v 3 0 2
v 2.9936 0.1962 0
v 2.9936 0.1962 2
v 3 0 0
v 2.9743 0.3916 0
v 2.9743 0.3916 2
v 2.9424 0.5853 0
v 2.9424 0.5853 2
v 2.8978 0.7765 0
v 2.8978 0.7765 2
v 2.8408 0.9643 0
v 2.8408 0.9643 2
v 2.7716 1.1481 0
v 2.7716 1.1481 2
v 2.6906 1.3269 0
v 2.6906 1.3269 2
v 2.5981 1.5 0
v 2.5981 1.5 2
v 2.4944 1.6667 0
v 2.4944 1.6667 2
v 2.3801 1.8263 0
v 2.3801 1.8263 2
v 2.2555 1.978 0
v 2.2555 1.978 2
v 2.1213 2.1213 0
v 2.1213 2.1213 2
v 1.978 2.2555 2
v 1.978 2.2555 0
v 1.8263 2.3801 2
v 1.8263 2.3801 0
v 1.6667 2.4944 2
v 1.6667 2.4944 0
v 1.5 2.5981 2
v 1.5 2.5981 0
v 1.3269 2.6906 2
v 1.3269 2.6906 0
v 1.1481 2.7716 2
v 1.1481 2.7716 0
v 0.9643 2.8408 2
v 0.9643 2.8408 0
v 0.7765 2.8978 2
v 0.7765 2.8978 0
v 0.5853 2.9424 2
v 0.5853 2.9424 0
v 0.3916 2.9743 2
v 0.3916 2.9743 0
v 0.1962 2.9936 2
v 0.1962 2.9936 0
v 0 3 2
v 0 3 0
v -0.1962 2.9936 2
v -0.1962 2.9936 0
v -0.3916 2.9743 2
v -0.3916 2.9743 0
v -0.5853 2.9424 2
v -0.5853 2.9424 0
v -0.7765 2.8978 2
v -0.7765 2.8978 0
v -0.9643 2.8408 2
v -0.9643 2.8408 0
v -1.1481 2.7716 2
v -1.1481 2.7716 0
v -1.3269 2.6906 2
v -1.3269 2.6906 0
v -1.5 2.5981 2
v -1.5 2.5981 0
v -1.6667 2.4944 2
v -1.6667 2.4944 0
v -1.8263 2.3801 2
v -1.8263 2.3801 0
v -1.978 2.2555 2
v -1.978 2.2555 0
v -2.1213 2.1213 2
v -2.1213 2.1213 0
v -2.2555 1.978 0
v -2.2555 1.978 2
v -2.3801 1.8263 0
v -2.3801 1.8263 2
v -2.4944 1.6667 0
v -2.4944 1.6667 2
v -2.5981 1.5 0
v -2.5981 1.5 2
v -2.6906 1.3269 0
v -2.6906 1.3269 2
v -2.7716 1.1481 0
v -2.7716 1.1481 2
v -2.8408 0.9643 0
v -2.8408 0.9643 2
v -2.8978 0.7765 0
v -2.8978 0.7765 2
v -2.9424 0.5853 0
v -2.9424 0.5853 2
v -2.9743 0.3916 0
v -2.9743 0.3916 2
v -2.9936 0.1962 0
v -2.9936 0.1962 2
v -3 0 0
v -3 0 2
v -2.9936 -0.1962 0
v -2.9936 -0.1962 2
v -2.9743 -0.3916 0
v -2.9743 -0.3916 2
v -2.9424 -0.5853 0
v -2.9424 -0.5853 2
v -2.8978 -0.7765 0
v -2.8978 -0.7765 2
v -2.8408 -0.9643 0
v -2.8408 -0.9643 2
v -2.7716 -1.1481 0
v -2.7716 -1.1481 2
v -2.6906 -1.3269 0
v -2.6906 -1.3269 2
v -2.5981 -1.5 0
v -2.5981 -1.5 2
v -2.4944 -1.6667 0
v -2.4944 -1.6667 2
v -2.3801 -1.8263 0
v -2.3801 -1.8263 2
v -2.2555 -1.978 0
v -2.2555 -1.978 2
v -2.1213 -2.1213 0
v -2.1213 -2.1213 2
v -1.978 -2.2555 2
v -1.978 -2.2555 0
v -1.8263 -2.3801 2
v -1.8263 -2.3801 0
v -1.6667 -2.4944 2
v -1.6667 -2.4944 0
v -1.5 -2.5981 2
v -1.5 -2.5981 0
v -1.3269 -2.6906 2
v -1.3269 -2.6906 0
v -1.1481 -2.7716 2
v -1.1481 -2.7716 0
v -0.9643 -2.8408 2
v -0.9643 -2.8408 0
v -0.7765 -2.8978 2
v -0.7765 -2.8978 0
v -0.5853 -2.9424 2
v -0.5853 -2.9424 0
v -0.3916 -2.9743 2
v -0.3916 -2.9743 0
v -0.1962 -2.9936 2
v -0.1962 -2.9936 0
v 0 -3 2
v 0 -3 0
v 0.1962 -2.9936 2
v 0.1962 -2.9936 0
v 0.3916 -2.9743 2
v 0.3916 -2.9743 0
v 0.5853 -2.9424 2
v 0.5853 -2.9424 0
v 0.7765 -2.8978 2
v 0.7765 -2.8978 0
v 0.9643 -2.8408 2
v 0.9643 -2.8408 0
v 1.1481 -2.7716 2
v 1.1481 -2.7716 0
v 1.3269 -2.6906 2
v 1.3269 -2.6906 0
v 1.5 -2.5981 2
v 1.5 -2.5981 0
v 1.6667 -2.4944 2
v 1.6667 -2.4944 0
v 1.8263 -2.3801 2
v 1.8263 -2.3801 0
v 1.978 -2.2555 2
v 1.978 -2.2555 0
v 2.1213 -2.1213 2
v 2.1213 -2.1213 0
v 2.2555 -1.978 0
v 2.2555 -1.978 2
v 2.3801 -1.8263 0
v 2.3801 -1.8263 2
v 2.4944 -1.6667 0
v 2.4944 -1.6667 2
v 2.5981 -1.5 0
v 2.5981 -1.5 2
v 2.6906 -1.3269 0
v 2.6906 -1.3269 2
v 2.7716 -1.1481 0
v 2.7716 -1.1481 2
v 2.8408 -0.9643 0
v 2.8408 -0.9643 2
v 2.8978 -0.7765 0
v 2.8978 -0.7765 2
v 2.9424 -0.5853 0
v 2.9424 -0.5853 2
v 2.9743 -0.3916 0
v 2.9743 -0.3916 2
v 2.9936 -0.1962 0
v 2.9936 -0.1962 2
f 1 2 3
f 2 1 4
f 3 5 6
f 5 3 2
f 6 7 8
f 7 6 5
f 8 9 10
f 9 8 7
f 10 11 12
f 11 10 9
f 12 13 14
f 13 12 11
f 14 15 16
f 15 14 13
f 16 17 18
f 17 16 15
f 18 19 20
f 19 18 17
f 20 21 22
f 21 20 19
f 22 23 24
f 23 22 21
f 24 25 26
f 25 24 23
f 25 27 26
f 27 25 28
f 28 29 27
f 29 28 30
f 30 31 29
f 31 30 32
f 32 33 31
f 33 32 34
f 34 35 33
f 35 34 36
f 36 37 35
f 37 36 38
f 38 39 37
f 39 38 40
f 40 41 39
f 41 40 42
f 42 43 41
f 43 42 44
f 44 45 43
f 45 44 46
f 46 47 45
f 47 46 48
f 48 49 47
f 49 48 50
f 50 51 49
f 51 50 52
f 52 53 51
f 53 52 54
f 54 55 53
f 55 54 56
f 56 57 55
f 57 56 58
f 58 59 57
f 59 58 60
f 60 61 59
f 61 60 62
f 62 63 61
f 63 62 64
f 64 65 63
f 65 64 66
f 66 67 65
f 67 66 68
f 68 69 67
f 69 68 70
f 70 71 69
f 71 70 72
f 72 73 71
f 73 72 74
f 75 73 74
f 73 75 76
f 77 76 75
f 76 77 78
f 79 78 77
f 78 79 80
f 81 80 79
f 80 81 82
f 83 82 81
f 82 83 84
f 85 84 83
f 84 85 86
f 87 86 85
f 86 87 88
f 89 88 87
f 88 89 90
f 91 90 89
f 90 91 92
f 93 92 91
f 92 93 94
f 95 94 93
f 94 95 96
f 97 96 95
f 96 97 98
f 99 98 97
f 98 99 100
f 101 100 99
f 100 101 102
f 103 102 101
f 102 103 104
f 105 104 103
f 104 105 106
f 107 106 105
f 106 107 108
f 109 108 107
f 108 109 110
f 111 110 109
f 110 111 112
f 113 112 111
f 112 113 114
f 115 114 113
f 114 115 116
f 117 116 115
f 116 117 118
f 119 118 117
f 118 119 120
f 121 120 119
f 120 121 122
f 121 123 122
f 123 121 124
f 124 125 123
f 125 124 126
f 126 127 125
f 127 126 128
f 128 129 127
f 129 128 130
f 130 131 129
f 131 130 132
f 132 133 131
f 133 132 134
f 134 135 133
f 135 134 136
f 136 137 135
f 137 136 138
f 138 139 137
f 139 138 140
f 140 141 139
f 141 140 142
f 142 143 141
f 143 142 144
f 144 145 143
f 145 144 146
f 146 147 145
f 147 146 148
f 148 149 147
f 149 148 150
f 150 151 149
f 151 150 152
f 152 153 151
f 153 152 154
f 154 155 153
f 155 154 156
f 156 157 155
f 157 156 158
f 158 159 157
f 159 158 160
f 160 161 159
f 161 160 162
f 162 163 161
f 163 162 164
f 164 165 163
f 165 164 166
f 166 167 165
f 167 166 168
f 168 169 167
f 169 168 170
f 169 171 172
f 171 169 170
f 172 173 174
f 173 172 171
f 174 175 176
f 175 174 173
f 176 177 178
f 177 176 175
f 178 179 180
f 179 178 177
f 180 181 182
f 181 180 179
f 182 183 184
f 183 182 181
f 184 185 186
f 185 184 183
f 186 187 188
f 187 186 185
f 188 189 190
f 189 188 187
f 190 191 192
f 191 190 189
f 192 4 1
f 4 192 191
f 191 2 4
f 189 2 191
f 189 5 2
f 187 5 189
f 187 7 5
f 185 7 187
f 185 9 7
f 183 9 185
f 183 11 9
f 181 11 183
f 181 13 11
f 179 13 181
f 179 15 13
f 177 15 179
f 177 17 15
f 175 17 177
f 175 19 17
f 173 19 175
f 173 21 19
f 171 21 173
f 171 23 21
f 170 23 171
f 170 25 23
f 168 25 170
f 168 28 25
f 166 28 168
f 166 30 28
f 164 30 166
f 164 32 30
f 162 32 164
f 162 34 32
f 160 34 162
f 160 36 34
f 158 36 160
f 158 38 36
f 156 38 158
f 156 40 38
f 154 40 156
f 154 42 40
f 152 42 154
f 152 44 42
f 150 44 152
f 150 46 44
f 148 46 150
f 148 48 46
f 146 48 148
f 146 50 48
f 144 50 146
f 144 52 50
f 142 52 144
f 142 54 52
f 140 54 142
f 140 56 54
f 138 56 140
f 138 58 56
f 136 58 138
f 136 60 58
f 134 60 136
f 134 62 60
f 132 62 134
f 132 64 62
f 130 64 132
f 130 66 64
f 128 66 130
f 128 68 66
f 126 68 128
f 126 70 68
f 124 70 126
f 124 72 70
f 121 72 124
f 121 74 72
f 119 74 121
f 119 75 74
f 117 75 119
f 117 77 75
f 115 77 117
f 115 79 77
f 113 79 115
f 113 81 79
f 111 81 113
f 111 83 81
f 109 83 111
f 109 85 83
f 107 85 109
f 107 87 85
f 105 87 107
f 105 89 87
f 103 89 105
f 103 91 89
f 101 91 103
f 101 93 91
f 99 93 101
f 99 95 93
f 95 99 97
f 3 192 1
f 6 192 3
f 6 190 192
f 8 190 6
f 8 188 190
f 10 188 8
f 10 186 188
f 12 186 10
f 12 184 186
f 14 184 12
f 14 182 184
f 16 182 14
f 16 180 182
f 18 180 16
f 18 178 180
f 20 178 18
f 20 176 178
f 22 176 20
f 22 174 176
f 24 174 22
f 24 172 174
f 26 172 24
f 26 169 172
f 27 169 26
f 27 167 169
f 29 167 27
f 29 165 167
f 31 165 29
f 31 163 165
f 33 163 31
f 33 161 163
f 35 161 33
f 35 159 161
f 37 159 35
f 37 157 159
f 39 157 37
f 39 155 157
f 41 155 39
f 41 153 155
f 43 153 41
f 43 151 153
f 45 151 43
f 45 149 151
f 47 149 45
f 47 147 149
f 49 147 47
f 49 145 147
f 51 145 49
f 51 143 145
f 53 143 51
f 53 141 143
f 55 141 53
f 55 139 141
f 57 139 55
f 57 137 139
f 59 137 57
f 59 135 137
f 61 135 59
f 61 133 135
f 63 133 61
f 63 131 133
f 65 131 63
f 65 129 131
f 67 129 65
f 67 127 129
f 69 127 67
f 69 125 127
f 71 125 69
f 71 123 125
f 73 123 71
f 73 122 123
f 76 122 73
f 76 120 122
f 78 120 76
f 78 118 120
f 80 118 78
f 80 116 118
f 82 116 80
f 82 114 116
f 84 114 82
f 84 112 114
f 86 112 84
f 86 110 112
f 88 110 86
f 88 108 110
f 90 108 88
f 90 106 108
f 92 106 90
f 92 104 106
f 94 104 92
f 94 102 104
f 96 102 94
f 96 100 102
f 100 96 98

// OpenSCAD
// A magnet of the parts library (packages/contracts/src/parts/magnets.ts), at the sizes given as -D overrides: a disc
// (DIAMETER x HEIGHT), a ring (a disc with a HOLE) or a block (LENGTH x WIDTH x HEIGHT). `npm run check:assembly` renders it at
// the magnet's greatest size, as its pocket is cut, to check the magnets a model holds (e.g. the cigarette case's magnet snap).
// Frame: millimetres, Z is the magnetisation axis (the height), the magnet stands on z = 0, centred on the Z axis.

SHAPE = "disc";   // "disc", "ring" or "block"
DIAMETER = 6;
HOLE = 0;
LENGTH = 10;
WIDTH = 5;
HEIGHT = 2;

$fn = 96;

if (SHAPE == "block")
  translate([-LENGTH / 2, -WIDTH / 2, 0]) cube([LENGTH, WIDTH, HEIGHT]);
else
  difference() {
    cylinder(d = DIAMETER, h = HEIGHT);
    if (HOLE > 0) translate([0, 0, -1]) cylinder(d = HOLE, h = HEIGHT + 2);
  }
